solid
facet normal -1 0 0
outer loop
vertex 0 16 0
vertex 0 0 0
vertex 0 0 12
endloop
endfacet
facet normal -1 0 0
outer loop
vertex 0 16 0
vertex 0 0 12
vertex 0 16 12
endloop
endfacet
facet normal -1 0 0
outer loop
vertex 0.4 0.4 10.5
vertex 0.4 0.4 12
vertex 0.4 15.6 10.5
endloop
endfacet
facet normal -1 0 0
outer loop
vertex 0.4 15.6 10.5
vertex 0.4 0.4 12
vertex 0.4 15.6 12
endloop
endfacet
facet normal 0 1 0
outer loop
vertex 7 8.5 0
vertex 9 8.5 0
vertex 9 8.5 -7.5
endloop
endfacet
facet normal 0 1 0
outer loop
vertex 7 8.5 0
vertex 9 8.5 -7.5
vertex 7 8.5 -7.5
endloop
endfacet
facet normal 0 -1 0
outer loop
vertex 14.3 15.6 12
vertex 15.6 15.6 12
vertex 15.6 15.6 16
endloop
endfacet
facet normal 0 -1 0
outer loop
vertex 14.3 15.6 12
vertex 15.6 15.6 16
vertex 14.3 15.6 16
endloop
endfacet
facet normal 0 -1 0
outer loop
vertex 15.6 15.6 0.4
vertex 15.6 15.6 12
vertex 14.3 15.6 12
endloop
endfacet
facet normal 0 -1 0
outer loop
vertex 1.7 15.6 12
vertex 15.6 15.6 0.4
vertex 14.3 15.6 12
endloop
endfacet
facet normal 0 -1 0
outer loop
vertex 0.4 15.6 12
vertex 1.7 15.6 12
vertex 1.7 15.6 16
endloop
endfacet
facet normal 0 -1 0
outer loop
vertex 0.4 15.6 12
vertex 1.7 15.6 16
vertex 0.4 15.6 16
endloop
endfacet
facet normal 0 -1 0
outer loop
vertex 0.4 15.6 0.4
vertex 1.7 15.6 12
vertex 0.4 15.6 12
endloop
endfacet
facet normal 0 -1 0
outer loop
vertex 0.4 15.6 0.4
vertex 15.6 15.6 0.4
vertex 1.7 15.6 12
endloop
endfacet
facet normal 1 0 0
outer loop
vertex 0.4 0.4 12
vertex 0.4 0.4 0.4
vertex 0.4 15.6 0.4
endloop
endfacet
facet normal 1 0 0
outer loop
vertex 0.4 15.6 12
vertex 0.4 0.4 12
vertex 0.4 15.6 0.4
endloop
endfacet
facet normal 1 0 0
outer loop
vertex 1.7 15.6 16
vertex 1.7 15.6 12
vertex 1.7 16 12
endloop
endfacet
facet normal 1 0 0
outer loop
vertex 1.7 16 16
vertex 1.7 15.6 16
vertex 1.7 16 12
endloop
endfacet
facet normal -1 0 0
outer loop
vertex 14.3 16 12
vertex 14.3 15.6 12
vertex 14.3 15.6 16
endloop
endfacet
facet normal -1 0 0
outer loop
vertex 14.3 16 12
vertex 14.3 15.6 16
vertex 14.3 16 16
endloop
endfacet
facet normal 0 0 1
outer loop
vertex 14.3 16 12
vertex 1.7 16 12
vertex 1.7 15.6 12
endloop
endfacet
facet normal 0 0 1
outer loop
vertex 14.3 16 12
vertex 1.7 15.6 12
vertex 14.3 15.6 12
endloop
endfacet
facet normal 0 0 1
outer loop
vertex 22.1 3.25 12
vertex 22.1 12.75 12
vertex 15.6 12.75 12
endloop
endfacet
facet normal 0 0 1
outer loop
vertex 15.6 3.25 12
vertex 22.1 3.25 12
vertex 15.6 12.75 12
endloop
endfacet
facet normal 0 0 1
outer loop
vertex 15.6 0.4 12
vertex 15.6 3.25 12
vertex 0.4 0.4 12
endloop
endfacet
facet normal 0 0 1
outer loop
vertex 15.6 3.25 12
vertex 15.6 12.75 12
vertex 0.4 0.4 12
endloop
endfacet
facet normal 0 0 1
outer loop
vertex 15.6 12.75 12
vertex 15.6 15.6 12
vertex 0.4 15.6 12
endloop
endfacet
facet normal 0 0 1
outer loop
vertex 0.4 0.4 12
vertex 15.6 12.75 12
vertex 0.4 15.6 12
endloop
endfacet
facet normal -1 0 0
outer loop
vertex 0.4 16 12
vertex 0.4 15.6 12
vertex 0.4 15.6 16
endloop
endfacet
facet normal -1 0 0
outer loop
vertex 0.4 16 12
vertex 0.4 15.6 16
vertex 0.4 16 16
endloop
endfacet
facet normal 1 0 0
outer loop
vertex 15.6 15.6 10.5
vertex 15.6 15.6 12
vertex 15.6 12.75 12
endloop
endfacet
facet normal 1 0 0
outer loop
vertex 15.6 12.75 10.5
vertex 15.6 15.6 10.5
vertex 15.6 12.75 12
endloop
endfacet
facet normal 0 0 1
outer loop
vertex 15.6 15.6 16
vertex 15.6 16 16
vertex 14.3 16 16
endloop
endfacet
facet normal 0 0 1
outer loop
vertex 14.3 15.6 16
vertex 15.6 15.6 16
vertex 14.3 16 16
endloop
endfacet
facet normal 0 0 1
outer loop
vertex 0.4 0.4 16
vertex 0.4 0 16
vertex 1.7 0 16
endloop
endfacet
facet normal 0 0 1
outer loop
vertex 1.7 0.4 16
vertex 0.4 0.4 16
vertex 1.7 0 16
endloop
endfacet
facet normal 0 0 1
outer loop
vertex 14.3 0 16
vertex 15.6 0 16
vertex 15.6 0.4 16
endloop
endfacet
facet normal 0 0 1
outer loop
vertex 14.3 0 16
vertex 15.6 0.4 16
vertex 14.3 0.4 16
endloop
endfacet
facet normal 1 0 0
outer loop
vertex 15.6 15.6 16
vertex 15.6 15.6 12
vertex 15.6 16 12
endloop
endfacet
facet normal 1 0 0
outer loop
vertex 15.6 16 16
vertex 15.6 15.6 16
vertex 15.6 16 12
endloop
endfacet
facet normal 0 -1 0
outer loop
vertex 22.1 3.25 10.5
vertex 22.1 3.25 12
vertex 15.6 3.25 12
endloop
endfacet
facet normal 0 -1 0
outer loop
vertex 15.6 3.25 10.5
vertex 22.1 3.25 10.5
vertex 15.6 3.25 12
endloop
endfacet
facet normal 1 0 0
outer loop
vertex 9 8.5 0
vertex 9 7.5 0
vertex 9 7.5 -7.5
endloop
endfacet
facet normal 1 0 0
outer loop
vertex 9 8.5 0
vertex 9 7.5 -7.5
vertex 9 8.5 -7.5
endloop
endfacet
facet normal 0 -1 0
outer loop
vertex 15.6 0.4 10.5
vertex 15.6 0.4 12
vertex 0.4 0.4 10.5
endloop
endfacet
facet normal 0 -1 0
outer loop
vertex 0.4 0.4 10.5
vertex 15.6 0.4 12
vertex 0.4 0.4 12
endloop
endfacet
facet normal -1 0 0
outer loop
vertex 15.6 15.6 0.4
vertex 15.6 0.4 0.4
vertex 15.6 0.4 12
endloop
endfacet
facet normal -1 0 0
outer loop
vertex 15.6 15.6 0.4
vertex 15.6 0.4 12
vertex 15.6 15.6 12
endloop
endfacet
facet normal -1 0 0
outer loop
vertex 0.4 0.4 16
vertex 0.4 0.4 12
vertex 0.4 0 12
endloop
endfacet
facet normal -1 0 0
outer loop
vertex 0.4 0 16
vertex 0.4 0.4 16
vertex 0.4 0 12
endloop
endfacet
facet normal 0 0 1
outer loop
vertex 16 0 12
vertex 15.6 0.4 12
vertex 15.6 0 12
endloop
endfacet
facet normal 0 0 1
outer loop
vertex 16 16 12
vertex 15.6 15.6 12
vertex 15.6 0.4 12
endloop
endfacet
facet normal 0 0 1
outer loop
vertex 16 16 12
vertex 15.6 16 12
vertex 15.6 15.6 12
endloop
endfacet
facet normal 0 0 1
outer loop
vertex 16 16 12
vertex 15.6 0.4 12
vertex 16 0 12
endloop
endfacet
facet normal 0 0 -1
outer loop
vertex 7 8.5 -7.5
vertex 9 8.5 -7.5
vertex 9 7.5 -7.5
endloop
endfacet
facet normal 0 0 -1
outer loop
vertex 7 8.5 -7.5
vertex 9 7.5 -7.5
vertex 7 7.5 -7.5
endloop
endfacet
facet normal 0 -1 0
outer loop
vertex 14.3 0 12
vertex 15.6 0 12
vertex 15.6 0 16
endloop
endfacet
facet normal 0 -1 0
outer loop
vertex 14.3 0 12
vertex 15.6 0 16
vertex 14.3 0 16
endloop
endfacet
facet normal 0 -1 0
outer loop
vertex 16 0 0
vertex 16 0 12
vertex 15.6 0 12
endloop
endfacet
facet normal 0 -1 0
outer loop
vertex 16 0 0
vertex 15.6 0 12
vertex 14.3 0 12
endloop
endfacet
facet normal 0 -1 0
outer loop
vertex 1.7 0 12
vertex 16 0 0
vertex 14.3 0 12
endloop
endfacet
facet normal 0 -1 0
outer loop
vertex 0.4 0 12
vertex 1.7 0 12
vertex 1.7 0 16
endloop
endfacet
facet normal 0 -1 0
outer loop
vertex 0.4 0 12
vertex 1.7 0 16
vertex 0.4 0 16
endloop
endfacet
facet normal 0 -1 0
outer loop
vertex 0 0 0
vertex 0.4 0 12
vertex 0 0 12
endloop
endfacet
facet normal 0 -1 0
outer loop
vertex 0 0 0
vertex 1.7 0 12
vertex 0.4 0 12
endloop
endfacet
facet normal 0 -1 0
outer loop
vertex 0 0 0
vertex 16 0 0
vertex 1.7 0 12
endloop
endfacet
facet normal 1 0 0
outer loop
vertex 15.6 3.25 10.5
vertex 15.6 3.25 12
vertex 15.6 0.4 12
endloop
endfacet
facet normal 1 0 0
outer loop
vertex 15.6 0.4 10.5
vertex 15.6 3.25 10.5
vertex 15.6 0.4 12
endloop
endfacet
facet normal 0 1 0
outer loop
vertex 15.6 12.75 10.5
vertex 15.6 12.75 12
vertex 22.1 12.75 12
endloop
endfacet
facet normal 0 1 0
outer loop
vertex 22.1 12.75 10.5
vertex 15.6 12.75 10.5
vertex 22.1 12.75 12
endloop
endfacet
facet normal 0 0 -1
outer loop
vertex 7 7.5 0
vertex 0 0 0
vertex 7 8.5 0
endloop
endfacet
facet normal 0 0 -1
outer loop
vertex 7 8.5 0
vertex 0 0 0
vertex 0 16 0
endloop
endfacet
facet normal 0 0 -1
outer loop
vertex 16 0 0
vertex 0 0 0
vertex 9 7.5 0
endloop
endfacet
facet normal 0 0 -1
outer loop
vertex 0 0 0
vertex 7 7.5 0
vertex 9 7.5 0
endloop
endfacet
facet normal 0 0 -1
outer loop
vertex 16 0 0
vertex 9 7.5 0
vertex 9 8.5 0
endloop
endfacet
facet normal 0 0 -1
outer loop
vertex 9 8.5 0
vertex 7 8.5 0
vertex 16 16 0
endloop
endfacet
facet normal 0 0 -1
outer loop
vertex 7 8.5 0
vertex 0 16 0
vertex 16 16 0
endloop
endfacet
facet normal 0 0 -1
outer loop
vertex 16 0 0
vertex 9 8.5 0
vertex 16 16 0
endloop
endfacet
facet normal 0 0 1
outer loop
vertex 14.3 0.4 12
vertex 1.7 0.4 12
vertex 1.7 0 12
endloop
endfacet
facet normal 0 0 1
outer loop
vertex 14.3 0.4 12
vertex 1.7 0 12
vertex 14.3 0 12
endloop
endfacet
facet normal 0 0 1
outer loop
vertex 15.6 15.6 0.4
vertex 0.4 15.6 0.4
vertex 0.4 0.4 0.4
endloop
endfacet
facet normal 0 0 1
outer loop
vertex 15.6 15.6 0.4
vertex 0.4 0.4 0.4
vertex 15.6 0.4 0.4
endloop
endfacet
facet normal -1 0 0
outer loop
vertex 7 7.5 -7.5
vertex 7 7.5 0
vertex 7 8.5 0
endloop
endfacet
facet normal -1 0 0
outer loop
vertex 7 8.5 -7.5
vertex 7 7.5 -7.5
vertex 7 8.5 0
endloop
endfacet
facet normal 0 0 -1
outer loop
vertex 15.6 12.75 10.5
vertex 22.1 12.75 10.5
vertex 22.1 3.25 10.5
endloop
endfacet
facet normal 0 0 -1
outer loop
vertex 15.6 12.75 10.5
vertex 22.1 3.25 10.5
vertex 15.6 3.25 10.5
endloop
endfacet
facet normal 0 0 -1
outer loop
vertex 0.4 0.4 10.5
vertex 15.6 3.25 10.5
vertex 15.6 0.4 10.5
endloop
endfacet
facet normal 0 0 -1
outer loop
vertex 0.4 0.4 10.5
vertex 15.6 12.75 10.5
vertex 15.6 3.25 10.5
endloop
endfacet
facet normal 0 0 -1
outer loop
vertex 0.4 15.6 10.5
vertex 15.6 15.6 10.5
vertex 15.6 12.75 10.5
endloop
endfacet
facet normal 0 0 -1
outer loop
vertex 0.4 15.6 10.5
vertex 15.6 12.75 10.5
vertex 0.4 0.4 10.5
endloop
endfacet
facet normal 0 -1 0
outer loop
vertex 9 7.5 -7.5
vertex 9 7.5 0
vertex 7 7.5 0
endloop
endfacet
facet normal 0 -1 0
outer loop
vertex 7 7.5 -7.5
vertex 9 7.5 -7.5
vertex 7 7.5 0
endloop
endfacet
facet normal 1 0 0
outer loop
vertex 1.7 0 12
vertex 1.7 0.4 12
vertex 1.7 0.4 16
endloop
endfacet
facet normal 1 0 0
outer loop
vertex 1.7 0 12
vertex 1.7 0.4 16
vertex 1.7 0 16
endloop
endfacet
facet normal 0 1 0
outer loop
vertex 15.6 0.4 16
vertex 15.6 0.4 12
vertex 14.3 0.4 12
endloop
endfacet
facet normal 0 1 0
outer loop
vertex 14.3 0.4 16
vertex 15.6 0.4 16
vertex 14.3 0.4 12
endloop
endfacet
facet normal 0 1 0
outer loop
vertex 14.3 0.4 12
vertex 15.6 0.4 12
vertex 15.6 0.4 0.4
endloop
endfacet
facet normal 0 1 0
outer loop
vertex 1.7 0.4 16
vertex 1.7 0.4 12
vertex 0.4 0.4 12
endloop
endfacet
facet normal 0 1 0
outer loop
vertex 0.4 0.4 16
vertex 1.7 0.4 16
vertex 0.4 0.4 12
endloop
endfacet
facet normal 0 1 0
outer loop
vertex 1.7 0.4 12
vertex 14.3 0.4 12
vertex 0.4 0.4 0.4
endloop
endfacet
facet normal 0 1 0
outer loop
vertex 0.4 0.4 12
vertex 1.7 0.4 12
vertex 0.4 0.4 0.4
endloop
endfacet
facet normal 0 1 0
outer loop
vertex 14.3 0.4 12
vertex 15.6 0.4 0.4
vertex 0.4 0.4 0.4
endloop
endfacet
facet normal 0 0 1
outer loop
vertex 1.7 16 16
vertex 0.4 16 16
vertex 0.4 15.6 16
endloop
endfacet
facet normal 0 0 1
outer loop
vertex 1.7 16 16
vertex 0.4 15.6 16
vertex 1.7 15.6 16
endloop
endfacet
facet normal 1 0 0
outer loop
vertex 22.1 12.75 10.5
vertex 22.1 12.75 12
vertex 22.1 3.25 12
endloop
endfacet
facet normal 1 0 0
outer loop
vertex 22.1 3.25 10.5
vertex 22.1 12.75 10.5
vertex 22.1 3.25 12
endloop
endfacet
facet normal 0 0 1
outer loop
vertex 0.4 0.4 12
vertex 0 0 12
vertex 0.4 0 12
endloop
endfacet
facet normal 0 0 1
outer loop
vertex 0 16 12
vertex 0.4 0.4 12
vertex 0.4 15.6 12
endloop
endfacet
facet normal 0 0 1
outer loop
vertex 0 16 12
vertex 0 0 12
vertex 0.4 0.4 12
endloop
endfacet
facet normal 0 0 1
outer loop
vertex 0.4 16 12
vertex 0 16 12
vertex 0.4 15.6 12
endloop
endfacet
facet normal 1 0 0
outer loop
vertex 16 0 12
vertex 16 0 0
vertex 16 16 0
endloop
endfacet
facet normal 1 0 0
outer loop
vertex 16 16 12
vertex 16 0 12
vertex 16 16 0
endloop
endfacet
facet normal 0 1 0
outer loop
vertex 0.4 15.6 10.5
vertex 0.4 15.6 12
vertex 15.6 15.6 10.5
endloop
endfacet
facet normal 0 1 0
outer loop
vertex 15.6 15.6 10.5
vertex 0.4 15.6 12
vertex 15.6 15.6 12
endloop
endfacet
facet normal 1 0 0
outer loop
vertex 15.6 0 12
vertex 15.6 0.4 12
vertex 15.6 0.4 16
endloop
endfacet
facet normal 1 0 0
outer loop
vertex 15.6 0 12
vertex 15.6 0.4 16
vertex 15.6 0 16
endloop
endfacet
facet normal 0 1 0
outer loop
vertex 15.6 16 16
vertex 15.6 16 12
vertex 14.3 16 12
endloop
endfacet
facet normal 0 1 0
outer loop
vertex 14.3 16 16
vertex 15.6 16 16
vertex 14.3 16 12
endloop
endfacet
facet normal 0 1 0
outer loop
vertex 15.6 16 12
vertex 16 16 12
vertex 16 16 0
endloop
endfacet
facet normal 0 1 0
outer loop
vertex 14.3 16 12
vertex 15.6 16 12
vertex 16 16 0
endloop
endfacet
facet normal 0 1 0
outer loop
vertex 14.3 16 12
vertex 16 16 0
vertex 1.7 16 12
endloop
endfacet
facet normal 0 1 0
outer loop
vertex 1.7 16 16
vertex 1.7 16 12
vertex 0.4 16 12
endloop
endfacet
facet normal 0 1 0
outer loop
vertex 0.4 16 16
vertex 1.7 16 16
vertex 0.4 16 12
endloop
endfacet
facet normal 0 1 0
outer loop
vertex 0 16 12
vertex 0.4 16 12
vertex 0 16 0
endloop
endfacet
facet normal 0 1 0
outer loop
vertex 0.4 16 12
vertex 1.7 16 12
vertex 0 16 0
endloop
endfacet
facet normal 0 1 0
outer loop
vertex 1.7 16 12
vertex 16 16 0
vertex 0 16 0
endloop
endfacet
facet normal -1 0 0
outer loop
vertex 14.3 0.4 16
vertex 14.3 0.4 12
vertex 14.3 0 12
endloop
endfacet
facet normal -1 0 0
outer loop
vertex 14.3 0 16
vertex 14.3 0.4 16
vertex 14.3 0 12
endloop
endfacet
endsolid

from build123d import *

# Parameters (mm, degrees)
SKETCH_1_W               = 16
SKETCH_1_H               = 16
EXTRUDE_1_DEPTH          = 12
SHELL_1_T                = -0.4
SKETCH_2_W               = 1.3
SKETCH_2_H               = 0.4
EXTRUDE_2_DEPTH          = 4
MIRROR_2_COPY_1_SKETCH_W = 1.3
MIRROR_2_COPY_1_SKETCH_H = 0.4
MIRROR_2_COPY_1_DEPTH    = 4
MIRROR_2_COPY_2_SKETCH_W = 1.3
MIRROR_2_COPY_2_SKETCH_H = 0.4
MIRROR_2_COPY_2_DEPTH    = 4
EXTRUDE_3_DEPTH          = 1.5
SKETCH_4_W               = 2
SKETCH_4_H               = 1
EXTRUDE_4_DEPTH          = 7.5


with BuildPart() as part:
    # 스케치1 → 보스-돌출1 (new body)
    with BuildSketch(Plane.XY):
        with Locations((8, 8)):
            Rectangle(SKETCH_1_W, SKETCH_1_H)
    extrude(amount=EXTRUDE_1_DEPTH)

    # 쉘1
    shell_1_openings = [part.faces().sort_by_distance(p)[0] for p in [
        (8, 8, 12),
    ]]
    offset(amount=SHELL_1_T, openings=shell_1_openings, kind=Kind.INTERSECTION)

    # 스케치2 → 보스-돌출2 (add)
    with BuildSketch(Plane.XY.offset(12)):
        with Locations((1.05, 15.8)):
            Rectangle(SKETCH_2_W, SKETCH_2_H)
    extrude_2 = extrude(amount=EXTRUDE_2_DEPTH)

    # 대칭 복사1: 보스-돌출2 across plane
    add(extrude_2.mirror(Plane(origin=(8, 0, 0), x_dir=(0, 0, 1), z_dir=(1, 0, 0))))

    # 대칭 복사2 copy 1 sketch → 대칭 복사2 copy 1 (add)
    with BuildSketch(Plane(origin=(16, 16, 12), x_dir=(-1, 0, 0), z_dir=(0, 0, 1))):
        with Locations((1.05, 15.8)):
            Rectangle(MIRROR_2_COPY_1_SKETCH_W, MIRROR_2_COPY_1_SKETCH_H)
    extrude(amount=MIRROR_2_COPY_1_DEPTH)

    # 대칭 복사2 copy 2 sketch → 대칭 복사2 copy 2 (add)
    with BuildSketch(Plane(origin=(0, 16, 12), x_dir=(1, 0, 0), z_dir=(0, 0, 1))):
        with Locations((1.05, -15.8)):
            Rectangle(MIRROR_2_COPY_2_SKETCH_W, MIRROR_2_COPY_2_SKETCH_H)
    extrude(amount=MIRROR_2_COPY_2_DEPTH)

    # 스케치4 → 보스-돌출4 (add)
    with BuildSketch(Plane(origin=(0, 0, 0), x_dir=(-1, 0, 0), z_dir=(0, 0, -1))):
        with Locations((-8, 8)):
            Rectangle(SKETCH_4_W, SKETCH_4_H)
    extrude(amount=EXTRUDE_4_DEPTH)


with BuildPart() as body_2:
    # 스케치3 → 보스-돌출3 (new body)
    with BuildSketch(Plane.XY.offset(12)):
        Polygon((0.4, 15.6), (15.6, 15.6), (15.6, 12.75), (22.1, 12.75), (22.1, 3.25), (15.6, 3.25), (15.6, 0.4), (0.4, 0.4), align=None)
    extrude(amount=-EXTRUDE_3_DEPTH)


solid = Compound([part.part, body_2.part])
